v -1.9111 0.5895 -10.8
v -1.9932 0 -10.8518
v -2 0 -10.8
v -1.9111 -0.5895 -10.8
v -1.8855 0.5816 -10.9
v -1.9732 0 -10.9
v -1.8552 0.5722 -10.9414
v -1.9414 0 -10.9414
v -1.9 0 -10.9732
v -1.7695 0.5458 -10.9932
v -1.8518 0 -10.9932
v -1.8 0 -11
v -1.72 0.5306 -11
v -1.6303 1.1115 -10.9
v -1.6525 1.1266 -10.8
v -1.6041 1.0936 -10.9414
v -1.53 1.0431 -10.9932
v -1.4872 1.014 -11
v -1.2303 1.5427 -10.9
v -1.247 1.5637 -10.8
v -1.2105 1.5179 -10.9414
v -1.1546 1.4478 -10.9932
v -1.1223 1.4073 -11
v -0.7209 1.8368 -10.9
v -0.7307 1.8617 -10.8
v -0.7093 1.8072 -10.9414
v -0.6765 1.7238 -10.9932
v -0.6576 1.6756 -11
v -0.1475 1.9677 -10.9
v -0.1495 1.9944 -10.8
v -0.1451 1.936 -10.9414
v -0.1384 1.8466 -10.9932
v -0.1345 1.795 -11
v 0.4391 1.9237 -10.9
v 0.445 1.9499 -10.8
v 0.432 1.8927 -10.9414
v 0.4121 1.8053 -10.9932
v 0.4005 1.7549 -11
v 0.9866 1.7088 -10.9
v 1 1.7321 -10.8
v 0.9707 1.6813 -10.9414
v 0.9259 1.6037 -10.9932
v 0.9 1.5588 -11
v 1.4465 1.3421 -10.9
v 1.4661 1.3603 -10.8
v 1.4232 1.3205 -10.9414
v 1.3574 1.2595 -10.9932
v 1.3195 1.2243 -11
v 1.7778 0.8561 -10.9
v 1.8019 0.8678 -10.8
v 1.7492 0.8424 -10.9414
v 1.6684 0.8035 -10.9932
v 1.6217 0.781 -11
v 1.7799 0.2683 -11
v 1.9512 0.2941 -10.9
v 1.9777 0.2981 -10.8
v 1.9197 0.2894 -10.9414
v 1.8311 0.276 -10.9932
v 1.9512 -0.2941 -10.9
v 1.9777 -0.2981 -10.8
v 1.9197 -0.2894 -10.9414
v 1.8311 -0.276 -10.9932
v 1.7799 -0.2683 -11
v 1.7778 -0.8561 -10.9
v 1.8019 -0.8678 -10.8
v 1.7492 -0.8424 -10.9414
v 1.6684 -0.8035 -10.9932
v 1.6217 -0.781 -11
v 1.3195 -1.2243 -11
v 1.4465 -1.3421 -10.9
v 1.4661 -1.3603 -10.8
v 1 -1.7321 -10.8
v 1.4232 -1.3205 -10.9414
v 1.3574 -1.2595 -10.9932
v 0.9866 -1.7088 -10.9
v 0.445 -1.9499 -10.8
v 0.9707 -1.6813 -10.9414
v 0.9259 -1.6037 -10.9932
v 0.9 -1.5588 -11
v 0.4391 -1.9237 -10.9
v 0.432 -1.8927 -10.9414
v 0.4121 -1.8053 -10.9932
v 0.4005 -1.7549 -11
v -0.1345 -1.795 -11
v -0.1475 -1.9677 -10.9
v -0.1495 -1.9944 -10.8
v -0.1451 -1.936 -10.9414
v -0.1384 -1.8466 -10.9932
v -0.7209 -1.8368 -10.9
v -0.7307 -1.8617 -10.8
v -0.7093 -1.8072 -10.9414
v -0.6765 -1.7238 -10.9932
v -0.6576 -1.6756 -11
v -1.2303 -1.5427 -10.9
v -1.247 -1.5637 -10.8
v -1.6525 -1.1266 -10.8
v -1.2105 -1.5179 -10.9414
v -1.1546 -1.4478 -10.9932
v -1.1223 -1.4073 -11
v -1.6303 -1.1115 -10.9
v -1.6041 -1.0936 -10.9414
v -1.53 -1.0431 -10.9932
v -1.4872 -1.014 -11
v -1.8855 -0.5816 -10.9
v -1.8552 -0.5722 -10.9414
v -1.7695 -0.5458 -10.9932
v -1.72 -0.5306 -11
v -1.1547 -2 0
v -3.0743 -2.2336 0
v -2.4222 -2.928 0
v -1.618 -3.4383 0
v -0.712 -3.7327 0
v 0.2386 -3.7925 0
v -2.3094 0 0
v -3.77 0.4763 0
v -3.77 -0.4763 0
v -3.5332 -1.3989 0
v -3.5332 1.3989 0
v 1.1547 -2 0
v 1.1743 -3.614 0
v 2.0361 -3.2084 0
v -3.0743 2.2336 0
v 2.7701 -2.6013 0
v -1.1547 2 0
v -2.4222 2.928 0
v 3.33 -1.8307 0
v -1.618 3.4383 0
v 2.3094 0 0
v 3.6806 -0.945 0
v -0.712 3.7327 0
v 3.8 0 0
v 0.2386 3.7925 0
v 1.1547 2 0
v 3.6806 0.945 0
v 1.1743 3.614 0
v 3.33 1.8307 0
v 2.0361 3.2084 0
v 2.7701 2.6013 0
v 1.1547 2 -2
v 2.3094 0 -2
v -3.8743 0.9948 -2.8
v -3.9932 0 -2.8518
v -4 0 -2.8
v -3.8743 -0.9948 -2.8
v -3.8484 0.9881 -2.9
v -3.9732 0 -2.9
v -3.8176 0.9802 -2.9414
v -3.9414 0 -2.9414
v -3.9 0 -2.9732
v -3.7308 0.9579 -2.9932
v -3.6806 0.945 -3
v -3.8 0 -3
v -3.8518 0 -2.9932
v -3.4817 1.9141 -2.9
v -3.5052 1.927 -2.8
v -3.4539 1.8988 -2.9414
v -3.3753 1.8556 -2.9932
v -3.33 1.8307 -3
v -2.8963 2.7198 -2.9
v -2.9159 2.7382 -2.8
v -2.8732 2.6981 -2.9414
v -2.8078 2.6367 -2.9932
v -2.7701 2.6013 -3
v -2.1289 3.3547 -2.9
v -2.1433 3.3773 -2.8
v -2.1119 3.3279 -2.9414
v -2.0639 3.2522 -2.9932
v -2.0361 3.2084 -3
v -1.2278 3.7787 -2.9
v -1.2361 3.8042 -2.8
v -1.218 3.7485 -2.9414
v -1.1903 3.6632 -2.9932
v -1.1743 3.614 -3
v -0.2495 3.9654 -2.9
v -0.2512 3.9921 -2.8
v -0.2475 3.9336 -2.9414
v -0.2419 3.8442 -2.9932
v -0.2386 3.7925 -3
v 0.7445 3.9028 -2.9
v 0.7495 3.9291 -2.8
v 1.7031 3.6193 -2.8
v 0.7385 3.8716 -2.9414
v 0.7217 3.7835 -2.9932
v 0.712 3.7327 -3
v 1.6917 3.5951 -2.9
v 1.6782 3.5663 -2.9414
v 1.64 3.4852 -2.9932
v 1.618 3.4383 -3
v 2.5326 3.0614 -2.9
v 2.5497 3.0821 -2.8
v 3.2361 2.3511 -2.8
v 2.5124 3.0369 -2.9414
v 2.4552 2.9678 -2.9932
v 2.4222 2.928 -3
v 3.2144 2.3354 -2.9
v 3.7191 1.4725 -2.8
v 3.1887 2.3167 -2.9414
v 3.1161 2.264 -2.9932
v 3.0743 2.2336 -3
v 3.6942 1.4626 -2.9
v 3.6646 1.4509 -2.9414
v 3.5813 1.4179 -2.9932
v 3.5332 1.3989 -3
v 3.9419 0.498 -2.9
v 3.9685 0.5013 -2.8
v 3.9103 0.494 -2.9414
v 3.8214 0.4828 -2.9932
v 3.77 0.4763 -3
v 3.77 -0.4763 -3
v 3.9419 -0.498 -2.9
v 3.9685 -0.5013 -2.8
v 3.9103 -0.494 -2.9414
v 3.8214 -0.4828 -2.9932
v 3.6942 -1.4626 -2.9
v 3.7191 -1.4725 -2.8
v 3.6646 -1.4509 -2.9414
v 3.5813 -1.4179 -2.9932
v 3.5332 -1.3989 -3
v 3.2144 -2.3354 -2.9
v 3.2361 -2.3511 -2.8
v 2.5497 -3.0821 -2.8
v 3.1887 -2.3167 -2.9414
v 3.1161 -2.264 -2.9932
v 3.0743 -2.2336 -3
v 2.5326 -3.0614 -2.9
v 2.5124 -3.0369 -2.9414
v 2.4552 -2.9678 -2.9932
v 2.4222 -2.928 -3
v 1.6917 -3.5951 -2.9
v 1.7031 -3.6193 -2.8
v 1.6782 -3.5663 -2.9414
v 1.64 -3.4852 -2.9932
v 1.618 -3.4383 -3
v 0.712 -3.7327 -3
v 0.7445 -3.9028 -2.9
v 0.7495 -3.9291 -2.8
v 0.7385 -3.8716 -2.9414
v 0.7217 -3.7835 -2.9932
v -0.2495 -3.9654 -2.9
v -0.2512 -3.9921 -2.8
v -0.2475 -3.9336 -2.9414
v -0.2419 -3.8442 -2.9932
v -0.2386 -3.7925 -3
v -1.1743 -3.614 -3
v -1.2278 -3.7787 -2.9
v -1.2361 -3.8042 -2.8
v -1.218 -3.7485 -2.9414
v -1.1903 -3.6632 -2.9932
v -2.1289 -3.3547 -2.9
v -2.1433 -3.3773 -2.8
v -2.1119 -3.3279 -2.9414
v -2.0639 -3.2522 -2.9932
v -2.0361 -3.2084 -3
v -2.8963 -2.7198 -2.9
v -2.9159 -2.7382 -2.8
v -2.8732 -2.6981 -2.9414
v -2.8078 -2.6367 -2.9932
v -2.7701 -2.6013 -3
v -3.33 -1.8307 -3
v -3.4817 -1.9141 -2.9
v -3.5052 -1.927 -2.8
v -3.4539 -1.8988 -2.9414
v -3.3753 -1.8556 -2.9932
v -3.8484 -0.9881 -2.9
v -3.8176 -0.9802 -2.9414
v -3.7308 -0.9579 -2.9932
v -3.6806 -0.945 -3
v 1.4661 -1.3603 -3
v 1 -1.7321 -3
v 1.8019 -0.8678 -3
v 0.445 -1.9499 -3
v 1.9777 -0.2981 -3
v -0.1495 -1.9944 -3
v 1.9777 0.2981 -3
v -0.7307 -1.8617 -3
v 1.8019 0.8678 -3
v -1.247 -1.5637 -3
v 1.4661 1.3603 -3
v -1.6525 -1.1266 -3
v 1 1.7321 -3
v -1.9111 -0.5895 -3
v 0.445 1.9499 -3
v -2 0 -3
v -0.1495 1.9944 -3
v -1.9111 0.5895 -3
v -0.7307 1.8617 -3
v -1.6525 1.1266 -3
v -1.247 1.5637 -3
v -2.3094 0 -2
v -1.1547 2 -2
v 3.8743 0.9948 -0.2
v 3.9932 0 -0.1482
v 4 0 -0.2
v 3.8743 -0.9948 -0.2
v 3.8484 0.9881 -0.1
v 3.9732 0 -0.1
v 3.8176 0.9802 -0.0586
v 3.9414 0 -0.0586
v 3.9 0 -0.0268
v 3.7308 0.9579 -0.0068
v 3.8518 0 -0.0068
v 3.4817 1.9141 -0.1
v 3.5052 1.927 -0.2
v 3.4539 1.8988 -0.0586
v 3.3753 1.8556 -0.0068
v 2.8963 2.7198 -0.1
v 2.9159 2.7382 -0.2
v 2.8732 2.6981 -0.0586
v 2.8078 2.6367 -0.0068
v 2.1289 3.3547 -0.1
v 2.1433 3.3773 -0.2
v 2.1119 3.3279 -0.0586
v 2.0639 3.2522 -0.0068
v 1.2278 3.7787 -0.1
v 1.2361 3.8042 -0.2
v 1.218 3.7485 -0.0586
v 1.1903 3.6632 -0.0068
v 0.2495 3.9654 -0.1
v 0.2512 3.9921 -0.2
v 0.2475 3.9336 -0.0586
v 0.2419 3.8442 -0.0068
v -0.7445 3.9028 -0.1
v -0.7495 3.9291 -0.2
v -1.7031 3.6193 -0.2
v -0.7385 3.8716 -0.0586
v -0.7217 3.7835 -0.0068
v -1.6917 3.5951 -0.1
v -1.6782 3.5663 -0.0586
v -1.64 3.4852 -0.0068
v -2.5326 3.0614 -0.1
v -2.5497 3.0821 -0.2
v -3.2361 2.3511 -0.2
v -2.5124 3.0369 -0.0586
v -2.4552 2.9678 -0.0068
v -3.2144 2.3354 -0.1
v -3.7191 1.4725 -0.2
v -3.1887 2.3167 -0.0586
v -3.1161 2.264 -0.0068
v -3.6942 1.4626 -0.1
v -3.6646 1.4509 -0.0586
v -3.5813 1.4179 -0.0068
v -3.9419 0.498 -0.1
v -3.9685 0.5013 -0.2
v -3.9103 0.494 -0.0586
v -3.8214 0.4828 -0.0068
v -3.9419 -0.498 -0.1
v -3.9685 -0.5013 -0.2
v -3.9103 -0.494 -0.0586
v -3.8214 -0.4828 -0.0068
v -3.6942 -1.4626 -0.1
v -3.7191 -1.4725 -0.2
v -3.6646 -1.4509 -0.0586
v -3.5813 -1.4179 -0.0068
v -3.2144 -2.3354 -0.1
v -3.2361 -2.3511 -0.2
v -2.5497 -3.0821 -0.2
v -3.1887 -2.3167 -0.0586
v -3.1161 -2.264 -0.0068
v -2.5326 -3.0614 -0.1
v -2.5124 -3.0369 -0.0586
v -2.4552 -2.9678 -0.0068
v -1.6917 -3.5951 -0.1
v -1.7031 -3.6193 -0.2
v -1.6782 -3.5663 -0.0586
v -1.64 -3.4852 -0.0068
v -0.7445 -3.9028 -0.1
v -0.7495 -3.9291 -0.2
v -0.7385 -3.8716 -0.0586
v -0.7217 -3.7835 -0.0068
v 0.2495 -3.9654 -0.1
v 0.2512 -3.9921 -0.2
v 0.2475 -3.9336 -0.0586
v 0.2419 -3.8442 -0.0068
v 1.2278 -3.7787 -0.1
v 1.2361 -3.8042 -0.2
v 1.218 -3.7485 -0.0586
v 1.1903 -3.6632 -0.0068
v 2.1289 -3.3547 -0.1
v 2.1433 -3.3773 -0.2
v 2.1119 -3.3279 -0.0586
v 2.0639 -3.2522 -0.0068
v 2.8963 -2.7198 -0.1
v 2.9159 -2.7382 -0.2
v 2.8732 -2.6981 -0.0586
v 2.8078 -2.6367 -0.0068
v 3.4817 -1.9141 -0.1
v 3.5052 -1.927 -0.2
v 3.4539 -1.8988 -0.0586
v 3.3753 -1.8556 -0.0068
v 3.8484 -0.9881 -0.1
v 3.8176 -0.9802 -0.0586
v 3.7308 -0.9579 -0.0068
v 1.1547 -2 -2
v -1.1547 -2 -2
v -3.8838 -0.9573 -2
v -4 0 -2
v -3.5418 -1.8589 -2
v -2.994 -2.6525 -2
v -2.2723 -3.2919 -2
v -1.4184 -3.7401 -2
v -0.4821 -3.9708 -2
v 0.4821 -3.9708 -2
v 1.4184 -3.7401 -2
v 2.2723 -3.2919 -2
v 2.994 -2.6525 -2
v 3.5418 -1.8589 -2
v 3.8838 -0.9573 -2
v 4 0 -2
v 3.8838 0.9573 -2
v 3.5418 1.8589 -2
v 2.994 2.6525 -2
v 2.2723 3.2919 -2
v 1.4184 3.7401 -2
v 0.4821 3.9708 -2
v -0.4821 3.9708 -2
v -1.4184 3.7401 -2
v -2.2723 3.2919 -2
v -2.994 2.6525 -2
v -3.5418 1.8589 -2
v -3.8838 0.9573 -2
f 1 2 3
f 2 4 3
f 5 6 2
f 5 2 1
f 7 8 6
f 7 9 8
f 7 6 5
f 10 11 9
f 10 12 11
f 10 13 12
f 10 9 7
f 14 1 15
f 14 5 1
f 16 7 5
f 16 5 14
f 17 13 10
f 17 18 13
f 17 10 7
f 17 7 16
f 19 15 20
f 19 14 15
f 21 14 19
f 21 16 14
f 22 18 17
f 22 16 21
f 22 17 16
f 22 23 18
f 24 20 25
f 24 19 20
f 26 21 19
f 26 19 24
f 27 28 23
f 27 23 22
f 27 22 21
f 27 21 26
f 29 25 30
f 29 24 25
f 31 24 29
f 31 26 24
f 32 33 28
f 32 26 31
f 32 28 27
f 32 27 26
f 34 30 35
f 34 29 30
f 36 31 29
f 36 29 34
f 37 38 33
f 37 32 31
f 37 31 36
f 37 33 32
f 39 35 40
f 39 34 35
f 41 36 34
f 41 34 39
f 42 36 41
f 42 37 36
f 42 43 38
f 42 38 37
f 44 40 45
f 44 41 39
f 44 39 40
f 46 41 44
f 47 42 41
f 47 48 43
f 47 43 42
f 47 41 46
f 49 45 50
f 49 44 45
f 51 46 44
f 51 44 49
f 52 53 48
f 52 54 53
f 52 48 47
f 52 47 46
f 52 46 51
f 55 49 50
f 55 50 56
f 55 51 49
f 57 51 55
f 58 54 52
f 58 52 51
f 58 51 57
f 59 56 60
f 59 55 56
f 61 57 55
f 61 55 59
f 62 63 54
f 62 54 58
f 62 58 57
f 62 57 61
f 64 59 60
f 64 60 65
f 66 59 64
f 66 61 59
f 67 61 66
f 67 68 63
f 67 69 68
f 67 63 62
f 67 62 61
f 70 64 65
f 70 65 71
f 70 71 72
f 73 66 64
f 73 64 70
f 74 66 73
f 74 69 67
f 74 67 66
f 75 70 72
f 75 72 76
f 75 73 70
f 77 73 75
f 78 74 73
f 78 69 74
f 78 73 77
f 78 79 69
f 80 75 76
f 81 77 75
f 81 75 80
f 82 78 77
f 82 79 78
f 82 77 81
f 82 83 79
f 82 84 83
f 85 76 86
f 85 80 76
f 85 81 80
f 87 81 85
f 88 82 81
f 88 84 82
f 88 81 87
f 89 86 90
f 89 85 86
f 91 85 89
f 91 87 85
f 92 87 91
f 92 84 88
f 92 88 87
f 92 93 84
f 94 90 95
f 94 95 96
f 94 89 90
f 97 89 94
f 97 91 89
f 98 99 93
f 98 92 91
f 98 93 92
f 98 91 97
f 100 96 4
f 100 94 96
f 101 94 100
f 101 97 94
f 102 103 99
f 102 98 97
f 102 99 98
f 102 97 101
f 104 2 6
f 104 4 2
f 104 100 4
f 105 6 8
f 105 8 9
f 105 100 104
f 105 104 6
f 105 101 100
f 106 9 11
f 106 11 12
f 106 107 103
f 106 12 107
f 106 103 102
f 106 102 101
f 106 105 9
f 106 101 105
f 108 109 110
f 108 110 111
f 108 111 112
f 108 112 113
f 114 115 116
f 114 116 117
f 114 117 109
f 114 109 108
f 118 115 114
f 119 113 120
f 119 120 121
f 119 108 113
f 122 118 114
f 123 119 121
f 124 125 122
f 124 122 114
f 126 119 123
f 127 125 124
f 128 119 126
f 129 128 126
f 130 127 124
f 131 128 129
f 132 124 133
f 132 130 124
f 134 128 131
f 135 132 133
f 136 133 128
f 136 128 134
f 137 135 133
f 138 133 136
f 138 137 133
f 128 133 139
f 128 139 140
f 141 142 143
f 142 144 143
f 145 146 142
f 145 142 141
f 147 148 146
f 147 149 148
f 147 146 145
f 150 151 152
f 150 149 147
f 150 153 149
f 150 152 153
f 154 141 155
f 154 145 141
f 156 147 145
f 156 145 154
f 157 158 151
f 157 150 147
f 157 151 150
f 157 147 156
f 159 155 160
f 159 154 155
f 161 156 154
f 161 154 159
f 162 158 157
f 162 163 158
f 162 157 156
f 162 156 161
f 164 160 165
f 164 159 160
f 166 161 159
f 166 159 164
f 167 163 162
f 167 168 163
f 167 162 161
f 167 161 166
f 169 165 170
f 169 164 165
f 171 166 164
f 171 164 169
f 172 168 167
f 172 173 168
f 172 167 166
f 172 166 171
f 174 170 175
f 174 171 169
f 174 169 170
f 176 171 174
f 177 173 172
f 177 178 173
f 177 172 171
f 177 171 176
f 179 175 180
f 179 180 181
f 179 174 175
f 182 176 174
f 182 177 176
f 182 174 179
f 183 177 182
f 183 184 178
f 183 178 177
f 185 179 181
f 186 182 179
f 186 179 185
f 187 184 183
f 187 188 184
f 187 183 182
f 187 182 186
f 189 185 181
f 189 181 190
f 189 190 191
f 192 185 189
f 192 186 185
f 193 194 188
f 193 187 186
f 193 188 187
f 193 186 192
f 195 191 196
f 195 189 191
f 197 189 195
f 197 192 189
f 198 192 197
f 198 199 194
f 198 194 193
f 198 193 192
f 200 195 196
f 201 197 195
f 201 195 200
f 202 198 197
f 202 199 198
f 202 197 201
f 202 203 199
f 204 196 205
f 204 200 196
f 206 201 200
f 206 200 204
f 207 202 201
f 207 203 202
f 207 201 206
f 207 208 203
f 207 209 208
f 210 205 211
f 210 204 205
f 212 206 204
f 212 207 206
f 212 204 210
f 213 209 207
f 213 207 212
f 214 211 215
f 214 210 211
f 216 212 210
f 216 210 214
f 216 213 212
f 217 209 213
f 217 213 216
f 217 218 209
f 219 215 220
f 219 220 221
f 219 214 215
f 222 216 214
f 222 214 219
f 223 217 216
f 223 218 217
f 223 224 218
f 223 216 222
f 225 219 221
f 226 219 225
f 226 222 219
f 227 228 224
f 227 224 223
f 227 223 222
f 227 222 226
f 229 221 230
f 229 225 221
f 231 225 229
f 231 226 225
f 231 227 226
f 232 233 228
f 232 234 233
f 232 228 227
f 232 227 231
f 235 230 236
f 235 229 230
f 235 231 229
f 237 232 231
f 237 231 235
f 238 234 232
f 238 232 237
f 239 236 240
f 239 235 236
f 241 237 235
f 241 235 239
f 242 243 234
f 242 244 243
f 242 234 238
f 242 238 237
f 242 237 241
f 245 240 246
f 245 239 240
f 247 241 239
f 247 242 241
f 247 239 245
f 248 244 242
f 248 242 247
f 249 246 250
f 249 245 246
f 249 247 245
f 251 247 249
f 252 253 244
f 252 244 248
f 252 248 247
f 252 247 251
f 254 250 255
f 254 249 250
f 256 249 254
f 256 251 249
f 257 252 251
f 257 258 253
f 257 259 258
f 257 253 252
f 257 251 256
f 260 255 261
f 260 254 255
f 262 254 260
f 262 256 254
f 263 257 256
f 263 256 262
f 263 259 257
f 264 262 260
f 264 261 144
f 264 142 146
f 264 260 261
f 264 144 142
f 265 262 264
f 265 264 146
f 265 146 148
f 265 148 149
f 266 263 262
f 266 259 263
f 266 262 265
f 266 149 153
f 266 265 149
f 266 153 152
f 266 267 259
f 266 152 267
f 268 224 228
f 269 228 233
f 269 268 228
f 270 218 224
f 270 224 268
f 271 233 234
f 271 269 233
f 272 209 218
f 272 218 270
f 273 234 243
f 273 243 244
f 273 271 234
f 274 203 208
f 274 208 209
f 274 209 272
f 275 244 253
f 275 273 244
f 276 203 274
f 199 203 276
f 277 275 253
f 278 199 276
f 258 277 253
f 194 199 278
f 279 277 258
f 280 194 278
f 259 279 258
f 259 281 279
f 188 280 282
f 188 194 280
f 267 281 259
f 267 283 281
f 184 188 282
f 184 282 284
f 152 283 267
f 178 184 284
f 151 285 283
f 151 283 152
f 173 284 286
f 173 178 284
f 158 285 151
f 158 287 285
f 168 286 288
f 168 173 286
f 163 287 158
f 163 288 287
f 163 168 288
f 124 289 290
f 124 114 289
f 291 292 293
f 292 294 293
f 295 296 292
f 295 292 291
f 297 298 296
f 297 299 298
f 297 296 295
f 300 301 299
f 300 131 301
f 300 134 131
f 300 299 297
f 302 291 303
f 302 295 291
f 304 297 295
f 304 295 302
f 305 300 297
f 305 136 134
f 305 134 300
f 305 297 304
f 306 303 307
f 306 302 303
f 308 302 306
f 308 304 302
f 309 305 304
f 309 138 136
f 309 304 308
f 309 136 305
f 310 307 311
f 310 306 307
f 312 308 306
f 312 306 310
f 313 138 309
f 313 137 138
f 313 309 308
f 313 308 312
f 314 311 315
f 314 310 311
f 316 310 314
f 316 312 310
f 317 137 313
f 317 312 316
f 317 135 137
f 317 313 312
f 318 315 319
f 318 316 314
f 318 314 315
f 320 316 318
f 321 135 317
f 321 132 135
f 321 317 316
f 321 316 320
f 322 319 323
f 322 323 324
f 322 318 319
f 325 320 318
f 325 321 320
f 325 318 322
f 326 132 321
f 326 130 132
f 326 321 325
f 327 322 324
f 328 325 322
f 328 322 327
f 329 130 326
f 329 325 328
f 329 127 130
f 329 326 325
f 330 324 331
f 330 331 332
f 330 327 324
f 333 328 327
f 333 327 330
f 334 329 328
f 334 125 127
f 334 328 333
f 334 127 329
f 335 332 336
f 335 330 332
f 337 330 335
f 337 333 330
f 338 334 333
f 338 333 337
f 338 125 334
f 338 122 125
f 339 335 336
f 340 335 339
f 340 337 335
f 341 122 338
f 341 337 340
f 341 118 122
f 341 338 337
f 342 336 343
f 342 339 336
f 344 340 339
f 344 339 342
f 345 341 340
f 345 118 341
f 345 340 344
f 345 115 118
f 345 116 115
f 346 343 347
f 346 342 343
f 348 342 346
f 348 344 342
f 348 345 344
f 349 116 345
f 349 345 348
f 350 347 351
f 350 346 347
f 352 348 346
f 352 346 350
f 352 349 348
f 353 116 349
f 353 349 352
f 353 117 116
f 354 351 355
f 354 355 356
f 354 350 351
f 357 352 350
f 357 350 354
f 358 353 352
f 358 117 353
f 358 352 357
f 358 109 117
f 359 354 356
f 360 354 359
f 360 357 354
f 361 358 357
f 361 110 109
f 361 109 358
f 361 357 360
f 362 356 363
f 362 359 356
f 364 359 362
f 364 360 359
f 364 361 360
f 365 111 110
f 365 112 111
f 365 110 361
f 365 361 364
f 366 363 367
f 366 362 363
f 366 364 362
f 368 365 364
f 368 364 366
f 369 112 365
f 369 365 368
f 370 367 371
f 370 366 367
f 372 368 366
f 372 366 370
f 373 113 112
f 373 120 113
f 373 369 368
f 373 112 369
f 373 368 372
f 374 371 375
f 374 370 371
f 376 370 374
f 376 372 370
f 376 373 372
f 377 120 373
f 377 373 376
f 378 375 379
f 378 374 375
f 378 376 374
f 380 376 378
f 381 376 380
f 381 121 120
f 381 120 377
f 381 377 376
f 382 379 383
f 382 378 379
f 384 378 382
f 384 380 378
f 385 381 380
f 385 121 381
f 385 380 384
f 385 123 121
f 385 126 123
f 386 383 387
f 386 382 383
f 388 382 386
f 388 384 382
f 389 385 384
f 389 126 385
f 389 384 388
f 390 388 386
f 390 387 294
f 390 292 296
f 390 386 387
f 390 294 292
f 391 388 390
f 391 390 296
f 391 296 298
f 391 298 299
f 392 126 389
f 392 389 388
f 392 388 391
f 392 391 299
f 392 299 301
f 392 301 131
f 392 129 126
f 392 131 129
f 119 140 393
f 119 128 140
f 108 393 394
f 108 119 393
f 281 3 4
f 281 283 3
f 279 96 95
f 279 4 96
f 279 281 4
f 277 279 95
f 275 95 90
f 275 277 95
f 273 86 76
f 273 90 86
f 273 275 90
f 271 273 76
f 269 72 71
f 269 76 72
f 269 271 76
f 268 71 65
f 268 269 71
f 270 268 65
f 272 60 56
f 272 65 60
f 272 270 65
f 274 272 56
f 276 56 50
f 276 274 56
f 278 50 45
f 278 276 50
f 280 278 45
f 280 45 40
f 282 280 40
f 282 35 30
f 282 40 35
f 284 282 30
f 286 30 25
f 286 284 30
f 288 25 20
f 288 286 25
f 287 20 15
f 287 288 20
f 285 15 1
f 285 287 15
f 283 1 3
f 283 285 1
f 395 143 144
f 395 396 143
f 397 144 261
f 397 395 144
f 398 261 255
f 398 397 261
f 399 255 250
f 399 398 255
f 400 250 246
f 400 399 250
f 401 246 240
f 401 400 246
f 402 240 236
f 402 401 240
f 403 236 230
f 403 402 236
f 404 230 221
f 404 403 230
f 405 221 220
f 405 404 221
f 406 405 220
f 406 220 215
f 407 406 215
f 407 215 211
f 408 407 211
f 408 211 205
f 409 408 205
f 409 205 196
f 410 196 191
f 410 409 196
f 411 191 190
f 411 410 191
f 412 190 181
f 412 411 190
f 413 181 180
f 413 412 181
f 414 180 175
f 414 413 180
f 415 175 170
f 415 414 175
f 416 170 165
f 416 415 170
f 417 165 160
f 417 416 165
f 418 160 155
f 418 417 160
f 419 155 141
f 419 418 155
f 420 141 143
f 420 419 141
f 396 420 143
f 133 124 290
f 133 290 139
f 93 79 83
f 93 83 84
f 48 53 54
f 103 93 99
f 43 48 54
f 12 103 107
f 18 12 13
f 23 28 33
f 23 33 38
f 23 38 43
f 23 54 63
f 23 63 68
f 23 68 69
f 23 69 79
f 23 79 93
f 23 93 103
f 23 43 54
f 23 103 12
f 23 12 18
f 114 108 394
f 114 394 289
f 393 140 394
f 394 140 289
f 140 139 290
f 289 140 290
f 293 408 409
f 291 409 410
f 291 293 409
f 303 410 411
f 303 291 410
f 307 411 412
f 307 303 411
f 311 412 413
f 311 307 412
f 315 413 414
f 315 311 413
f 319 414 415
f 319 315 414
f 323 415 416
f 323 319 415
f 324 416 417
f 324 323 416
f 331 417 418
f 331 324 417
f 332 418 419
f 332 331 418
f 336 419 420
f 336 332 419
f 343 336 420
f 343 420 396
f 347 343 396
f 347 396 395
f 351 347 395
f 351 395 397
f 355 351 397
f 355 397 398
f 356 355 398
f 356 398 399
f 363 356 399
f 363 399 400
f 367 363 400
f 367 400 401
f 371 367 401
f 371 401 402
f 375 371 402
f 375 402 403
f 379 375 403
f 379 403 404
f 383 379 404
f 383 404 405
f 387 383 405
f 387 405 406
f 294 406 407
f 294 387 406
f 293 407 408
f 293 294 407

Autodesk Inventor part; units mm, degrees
ref_plane "YZ Plane" through (0, 0, 0) normal (1, 0, 0) x (0, 1, 0)
ref_plane "XZ Plane" through (0, 0, 0) normal (0, 1, 0) x (-1, 0, 0)
ref_plane "XY Plane" through (0, 0, 0) normal (0, 0, 1) x (1, 0, 0)
sketch "Sketch1" plane through (0, 0, 0) normal (0, 0, 1) x (1, 0, 0)
  circle A0 centre (0, 0) radius 4
  line L0 (1.1547, 2) -> (2.3094, 0)
  line L1 (2.3094, 0) -> (1.1547, -2)
  line L2 (1.1547, -2) -> (-1.1547, -2)
  line L3 (-1.1547, -2) -> (-2.3094, 0)
  line L4 (-2.3094, 0) -> (-1.1547, 2)
  line L5 (-1.1547, 2) -> (1.1547, 2)
  dimension "d0" = 8
  dimension "d1" = 4
extrude "Extrusion1" add sketch "Sketch1" against normal blind 2
sketch "Sketch2" plane through (0, 0, -2) normal (0, 0, -1) x (-1, 0, 0)
  circle A0 centre (0, 0) radius 4 projected
extrude "Extrusion2" add sketch "Sketch2" along normal blind 1
sketch "Sketch3" plane through (0, 0, -3) normal (0, 0, -1) x (-1, 0, 0)
  circle A0 centre (0, 0) radius 2
  dimension "d6" = 4
extrude "Extrusion3" add sketch "Sketch3" along normal blind 8
fillet "Fillet1" radius 0.2 3 edges at (4, 0, -3) (-4, 0, 0) (2, 0, -11)
thread "Thread1" size "M5x0.8" class "6g" standard "ANSI Metric M Profile" length 7.8
properties part number "M3 x 8 Socket Head Bolt"
